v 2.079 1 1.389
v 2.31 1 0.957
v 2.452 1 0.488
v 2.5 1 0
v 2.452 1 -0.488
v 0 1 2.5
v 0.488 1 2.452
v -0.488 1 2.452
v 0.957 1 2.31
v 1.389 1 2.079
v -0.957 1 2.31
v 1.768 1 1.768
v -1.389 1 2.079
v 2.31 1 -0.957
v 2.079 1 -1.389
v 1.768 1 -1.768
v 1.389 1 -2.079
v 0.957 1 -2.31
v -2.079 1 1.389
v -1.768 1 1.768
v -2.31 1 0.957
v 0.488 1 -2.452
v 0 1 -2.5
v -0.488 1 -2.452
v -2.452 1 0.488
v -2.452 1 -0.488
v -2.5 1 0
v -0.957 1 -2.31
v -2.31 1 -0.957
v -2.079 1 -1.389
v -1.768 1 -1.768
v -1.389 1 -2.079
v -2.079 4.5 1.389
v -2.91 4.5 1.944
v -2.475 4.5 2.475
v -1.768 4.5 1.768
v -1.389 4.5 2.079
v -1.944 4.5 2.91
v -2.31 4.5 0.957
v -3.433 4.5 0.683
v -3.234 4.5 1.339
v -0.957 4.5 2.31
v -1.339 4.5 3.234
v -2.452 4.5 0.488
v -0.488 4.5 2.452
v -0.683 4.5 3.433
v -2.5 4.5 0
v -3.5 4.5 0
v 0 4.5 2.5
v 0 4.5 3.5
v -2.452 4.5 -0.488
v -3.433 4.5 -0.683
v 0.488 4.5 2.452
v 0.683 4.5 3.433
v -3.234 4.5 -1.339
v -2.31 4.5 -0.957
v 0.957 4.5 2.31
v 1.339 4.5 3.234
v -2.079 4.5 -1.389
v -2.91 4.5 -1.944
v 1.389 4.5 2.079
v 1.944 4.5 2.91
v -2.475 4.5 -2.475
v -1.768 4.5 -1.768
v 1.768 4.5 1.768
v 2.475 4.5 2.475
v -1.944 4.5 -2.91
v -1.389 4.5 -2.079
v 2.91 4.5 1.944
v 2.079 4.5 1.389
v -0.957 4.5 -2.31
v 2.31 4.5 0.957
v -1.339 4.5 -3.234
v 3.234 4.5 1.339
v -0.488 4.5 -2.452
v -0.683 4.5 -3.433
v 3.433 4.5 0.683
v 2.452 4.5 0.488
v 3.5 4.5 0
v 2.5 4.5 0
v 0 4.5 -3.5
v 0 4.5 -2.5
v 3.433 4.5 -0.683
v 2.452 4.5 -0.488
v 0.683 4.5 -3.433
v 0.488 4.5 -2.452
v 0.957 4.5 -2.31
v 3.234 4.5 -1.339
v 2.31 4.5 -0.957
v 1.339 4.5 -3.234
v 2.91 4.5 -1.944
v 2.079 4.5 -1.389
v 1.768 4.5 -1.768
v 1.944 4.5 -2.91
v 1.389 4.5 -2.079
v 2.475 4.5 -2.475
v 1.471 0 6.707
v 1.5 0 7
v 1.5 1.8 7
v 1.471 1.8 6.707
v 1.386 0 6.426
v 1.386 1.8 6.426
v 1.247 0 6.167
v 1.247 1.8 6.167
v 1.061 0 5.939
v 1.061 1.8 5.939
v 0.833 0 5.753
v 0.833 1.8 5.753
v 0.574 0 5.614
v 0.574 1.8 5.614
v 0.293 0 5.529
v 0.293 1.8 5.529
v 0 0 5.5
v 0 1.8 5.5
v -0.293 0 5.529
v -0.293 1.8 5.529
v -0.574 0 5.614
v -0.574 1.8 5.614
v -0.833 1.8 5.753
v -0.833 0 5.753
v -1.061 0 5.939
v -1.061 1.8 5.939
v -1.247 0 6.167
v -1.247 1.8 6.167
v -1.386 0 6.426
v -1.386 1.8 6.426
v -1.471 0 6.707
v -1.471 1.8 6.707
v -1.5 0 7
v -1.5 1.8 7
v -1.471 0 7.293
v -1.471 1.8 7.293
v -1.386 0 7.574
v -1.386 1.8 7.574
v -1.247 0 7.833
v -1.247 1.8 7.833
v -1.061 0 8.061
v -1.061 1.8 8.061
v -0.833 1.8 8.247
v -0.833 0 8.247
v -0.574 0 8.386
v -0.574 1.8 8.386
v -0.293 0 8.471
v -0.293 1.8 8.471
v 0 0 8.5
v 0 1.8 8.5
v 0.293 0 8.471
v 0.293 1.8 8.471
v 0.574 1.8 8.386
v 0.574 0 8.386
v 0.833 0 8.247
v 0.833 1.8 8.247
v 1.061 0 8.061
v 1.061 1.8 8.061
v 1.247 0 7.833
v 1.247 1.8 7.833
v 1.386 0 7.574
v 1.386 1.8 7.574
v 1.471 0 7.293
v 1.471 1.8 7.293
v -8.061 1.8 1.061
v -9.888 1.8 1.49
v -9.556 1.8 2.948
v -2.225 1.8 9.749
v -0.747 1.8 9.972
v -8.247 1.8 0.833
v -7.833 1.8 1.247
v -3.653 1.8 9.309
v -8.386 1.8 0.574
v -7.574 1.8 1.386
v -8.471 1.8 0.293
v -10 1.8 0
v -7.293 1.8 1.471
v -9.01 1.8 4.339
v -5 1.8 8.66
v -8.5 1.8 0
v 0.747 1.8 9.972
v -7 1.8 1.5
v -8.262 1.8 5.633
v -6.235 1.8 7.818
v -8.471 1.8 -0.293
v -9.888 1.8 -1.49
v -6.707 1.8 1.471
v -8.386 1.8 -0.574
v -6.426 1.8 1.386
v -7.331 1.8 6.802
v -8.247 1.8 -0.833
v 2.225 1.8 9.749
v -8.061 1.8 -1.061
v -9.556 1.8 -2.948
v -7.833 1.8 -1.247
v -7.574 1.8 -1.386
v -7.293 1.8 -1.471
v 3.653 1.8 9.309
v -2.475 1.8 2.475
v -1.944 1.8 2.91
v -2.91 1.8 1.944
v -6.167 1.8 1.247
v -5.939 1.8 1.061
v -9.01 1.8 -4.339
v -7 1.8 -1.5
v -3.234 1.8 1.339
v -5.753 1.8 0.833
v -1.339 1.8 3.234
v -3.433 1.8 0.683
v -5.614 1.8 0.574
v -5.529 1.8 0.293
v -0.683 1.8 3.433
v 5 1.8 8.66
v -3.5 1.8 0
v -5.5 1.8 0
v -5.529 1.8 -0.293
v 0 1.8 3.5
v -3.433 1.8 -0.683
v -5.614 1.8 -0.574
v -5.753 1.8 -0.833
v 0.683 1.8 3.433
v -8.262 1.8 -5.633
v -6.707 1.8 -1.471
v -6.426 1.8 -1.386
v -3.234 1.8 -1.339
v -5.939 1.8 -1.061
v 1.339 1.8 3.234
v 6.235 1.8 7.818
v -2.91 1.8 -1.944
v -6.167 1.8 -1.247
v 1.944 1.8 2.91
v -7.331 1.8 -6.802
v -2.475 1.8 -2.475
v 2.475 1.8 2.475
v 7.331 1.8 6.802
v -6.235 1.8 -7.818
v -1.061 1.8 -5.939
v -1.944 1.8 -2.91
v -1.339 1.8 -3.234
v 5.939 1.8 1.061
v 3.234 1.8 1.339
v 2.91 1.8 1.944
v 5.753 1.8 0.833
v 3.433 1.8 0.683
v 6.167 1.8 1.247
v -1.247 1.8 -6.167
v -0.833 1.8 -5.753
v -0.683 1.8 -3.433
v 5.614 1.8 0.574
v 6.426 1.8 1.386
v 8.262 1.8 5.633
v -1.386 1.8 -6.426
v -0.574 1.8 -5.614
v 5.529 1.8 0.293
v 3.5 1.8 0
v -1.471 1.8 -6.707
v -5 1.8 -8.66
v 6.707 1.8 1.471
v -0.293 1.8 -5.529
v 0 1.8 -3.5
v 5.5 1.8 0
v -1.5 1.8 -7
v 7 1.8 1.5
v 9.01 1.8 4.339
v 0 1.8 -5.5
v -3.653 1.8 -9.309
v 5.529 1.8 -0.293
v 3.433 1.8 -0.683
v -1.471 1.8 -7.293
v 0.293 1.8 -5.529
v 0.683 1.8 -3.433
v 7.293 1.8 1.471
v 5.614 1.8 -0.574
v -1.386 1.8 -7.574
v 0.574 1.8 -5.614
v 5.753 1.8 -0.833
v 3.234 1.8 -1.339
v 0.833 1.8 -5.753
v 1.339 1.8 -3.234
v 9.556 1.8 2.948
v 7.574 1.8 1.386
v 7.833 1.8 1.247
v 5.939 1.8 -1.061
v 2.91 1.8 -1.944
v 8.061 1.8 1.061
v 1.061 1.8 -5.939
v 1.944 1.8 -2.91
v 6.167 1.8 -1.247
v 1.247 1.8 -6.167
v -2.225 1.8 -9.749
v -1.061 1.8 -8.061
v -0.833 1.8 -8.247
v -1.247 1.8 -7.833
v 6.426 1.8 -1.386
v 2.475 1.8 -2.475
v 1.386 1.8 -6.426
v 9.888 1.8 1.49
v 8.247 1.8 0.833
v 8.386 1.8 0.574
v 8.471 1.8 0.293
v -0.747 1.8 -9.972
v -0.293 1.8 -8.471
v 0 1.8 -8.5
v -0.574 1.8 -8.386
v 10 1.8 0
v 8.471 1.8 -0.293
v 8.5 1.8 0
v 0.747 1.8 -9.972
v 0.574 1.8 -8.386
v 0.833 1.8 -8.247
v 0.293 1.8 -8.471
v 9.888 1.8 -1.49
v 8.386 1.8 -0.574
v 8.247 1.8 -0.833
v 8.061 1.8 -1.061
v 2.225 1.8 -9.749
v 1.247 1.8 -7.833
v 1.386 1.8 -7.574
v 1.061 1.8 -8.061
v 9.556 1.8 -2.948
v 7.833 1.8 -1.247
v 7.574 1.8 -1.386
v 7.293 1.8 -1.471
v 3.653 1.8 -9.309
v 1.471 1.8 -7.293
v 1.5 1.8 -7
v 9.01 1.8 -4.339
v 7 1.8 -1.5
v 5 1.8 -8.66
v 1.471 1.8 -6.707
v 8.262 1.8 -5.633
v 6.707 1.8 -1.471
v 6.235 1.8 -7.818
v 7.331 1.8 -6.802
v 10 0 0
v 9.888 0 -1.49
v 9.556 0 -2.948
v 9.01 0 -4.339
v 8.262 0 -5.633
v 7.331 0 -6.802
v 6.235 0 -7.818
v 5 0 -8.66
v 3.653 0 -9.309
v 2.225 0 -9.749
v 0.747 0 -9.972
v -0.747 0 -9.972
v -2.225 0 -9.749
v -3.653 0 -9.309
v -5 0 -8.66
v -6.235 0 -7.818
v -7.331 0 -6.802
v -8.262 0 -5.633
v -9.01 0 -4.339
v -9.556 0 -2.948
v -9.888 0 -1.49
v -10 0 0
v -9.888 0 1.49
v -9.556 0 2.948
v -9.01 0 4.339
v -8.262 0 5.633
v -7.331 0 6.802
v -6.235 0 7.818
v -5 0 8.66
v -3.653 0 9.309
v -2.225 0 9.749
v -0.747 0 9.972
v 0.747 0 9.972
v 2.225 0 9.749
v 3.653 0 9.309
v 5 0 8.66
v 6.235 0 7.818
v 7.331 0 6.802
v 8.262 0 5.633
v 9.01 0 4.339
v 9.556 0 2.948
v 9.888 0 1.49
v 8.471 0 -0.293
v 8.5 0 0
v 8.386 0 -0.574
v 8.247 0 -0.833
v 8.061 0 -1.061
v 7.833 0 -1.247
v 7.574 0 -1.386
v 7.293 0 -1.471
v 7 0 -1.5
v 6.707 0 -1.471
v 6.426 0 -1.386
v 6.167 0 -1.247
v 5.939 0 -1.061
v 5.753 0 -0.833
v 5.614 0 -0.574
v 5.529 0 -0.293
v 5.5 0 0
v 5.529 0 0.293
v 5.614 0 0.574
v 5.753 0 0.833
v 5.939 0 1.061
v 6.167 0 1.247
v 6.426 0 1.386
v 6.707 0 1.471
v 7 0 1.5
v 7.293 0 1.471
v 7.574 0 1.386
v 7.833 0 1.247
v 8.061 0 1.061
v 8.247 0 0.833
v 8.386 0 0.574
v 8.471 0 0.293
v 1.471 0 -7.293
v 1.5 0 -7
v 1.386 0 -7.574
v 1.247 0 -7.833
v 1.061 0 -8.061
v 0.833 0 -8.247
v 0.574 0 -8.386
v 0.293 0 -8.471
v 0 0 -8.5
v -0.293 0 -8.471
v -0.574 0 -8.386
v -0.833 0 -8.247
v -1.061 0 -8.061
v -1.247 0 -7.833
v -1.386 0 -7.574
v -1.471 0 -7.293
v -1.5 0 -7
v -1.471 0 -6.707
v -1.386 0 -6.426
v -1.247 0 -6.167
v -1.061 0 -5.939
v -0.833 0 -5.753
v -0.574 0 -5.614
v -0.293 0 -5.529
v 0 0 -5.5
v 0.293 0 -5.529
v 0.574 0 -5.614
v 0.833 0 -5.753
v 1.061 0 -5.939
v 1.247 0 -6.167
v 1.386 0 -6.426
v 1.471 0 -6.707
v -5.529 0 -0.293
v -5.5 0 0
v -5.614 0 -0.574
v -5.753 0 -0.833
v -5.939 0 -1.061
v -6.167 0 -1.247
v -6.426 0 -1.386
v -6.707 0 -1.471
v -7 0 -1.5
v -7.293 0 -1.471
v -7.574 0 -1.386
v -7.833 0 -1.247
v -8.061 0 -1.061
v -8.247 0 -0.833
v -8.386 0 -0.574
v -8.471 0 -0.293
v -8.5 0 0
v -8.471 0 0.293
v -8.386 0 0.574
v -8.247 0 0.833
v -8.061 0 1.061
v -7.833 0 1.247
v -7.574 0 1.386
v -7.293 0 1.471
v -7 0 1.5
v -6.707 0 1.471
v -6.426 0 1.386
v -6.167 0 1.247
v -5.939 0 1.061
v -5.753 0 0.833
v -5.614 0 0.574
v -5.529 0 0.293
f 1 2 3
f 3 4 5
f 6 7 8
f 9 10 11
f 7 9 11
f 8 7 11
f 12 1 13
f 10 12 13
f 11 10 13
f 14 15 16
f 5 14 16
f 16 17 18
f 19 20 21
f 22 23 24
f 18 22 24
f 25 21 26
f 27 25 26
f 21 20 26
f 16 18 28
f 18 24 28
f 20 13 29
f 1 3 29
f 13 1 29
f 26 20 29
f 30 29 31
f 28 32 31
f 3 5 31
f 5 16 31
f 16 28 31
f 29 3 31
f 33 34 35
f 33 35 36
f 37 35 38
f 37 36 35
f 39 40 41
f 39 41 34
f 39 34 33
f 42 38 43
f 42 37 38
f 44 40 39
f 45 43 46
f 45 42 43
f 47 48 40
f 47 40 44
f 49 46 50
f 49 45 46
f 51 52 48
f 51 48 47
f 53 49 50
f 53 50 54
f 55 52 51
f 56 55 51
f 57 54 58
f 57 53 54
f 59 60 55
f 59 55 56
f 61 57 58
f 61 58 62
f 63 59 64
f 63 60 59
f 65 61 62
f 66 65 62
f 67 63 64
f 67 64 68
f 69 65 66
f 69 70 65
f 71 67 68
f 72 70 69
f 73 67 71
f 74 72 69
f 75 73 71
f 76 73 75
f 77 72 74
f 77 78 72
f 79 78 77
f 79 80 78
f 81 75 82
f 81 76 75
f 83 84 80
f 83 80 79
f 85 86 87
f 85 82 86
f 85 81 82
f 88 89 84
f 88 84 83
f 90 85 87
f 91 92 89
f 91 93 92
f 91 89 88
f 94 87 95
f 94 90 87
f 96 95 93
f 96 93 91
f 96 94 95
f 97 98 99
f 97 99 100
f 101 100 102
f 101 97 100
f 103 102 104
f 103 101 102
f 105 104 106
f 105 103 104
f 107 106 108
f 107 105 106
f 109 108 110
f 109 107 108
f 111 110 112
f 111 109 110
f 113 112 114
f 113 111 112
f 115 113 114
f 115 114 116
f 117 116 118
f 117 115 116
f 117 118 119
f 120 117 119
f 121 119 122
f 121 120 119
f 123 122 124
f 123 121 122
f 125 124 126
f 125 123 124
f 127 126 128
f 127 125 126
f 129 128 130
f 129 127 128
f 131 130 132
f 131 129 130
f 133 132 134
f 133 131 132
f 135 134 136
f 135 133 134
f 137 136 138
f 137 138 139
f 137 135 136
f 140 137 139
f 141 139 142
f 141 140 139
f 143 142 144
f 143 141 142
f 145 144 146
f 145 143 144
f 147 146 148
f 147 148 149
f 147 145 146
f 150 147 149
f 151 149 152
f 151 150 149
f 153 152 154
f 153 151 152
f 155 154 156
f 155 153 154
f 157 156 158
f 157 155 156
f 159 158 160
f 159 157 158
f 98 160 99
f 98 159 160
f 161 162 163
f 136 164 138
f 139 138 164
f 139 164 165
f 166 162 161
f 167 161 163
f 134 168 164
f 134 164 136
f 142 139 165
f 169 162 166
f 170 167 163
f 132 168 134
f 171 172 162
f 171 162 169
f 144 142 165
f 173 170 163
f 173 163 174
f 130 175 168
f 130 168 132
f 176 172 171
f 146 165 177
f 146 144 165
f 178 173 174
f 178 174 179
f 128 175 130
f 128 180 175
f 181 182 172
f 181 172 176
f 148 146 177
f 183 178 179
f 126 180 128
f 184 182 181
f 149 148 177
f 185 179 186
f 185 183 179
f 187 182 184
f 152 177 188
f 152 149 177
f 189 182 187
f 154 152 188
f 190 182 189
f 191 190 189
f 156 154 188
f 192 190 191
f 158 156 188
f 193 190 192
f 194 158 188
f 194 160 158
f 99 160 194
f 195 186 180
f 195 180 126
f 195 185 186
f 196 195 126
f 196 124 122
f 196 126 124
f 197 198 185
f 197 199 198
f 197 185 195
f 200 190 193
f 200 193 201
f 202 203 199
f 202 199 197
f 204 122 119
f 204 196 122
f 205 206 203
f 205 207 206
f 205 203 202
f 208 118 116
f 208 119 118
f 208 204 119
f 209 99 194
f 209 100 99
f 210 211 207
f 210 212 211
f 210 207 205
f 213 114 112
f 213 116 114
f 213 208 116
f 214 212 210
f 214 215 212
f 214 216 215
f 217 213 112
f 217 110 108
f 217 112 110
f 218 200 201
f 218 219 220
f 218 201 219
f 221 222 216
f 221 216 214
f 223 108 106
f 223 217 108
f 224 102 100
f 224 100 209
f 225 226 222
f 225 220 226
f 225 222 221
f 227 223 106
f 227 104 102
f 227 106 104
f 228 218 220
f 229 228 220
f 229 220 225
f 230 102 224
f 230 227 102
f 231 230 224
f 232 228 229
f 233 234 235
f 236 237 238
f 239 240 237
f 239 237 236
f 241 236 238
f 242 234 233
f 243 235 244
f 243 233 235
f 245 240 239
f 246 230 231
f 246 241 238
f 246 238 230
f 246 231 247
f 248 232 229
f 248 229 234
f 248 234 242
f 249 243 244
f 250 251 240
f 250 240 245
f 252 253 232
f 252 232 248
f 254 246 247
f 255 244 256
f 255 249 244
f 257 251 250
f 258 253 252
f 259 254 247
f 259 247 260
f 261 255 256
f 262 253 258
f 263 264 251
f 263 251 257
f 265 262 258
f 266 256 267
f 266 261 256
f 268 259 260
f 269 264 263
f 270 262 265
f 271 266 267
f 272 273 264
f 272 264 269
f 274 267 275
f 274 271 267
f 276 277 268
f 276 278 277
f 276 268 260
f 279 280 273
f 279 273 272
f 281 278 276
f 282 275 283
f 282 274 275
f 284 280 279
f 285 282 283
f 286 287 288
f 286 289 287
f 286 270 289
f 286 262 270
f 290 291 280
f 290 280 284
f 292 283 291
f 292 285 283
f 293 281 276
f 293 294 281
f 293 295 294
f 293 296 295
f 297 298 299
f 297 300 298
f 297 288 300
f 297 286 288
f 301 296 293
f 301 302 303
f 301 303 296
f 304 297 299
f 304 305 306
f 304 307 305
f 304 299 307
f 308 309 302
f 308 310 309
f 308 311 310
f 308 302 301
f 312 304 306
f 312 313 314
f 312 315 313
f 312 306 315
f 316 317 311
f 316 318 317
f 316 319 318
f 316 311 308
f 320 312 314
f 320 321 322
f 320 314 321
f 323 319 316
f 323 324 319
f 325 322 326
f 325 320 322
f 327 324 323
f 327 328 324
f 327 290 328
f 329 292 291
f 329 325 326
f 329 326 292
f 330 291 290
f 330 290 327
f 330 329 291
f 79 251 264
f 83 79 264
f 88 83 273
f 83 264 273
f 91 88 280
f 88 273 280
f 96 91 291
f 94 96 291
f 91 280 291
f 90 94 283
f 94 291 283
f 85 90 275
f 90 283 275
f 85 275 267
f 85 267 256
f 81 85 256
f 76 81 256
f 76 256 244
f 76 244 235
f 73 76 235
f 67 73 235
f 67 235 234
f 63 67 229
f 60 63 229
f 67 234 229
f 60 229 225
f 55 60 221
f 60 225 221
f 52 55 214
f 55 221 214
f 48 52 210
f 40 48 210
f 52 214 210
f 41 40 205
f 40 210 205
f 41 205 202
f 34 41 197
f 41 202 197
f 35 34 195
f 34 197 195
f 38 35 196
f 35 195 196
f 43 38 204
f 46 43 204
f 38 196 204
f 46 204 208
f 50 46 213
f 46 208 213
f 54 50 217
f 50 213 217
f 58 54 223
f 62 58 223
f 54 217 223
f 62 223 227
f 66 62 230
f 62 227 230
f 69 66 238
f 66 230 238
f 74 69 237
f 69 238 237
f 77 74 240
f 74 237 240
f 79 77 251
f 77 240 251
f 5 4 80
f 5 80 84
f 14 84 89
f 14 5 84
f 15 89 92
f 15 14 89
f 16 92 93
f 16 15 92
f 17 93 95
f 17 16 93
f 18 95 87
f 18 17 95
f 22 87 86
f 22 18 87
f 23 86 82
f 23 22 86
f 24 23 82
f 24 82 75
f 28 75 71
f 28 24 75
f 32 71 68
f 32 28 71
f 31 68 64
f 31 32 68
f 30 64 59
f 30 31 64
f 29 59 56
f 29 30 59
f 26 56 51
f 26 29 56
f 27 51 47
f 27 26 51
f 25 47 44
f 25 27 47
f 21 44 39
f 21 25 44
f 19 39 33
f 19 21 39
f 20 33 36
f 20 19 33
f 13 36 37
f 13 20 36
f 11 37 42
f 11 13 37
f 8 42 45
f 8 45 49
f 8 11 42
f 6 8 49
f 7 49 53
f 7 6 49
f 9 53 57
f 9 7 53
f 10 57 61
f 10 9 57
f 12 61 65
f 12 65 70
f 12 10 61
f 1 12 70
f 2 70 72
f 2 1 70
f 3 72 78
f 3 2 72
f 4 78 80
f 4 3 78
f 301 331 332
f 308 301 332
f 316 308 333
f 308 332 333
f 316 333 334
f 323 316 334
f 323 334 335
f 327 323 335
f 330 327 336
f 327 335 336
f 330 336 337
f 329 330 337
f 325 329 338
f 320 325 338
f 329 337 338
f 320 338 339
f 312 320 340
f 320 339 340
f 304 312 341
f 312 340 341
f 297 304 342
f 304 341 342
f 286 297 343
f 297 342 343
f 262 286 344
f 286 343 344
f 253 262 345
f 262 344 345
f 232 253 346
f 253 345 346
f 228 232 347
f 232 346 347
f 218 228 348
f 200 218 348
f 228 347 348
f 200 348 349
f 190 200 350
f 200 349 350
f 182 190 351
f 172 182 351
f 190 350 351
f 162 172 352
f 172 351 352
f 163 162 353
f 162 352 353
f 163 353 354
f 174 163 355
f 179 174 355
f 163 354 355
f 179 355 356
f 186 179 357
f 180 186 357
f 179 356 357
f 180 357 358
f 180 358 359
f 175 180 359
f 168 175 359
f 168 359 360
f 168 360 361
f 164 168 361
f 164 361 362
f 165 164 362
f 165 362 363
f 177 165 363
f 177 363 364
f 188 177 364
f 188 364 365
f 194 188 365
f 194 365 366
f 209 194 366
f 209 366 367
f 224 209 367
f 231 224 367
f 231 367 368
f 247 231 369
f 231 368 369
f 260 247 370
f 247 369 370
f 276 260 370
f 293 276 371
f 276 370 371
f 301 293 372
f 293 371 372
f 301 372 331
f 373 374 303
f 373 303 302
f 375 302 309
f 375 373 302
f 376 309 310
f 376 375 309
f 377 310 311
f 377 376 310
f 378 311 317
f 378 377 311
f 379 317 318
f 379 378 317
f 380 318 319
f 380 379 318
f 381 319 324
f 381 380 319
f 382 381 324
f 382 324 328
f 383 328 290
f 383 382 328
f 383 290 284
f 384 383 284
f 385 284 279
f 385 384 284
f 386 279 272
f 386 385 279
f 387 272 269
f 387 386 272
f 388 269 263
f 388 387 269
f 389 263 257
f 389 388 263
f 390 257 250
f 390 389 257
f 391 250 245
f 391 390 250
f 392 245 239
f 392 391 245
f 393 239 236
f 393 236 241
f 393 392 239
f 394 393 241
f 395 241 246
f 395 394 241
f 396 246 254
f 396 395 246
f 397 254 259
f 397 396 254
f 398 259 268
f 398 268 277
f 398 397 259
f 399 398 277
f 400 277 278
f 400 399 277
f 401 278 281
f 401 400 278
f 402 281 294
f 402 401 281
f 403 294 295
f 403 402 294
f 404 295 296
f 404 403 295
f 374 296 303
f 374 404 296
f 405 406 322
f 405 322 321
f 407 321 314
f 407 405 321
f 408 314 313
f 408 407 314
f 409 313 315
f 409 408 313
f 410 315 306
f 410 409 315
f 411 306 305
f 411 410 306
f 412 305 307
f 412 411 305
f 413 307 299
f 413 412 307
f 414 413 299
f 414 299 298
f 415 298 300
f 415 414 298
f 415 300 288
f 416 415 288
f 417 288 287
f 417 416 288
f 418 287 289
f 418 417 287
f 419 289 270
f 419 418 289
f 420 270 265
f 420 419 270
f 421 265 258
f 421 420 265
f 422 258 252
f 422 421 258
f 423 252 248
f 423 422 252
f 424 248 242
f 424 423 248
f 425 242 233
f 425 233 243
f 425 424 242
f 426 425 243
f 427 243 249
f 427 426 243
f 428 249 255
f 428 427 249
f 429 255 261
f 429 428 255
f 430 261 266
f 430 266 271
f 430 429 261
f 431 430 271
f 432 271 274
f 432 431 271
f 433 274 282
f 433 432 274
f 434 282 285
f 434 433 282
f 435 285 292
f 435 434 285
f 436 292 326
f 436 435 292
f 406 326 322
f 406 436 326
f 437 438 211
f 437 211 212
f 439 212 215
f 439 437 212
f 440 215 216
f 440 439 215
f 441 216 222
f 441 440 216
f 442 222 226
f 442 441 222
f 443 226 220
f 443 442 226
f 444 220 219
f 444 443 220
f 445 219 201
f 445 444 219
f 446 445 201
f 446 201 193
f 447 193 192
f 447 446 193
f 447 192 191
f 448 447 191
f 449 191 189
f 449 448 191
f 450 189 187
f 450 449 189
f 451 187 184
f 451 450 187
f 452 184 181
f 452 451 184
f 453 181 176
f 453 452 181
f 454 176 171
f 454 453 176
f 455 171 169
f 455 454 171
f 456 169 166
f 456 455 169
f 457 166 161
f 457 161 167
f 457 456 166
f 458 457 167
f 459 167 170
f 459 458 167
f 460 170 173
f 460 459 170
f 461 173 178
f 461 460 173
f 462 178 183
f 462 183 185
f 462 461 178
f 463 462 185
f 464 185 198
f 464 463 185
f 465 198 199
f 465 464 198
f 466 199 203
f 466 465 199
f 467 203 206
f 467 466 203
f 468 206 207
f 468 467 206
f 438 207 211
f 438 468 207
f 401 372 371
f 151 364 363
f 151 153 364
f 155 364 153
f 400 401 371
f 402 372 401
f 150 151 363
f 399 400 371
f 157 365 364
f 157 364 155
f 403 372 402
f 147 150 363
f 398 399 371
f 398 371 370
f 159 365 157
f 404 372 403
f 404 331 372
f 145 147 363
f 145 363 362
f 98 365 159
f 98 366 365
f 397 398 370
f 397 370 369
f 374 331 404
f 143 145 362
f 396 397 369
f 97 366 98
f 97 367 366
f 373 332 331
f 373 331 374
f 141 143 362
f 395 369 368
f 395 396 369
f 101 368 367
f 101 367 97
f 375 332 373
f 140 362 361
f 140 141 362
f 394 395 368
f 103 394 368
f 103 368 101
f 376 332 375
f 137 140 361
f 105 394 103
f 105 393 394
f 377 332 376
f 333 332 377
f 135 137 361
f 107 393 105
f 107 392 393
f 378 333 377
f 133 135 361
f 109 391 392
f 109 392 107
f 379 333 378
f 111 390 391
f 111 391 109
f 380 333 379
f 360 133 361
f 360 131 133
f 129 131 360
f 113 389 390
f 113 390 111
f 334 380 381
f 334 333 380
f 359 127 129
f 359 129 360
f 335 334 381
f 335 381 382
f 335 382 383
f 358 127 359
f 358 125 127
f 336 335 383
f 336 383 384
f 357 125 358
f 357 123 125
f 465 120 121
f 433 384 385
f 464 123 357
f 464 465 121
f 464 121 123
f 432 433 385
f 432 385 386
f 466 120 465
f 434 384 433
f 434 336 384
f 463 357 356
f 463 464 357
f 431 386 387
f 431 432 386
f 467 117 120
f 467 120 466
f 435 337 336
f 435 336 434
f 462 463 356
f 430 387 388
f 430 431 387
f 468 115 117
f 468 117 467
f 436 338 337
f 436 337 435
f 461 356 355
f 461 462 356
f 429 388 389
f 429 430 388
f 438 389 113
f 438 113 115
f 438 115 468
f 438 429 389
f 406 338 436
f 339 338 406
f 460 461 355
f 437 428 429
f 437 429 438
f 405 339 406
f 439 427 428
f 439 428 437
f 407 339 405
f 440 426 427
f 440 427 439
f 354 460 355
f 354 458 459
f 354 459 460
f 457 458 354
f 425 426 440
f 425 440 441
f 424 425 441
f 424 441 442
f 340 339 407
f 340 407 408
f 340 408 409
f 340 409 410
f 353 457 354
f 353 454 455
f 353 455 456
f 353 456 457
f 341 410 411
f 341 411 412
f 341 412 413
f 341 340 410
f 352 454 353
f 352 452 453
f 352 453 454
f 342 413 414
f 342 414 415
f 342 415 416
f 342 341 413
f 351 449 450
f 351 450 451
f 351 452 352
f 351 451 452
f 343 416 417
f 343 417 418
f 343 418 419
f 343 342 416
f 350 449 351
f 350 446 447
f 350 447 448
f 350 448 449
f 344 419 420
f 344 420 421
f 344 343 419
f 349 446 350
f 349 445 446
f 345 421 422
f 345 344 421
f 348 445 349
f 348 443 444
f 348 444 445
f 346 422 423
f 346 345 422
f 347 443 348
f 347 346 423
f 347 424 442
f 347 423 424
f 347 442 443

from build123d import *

# Parameters (mm, degrees)
SKETCH1_R           = 10
SKETCH1_R_2         = 2.5
SKETCH1_R_3         = 1.5
BOSS_EXTRUDE1_DEPTH = 1.8
SKETCH2_R           = 3.5
SKETCH2_R_2         = 2.5
BOSS_EXTRUDE2_DEPTH = 2.7
SKETCH3_R           = 2.5
BOSS_EXTRUDE3_DEPTH = 1


with BuildPart() as part:
    # Sketch1 → Boss-Extrude1 (new body)
    with BuildSketch(Plane(origin=(0, 0, 0), x_dir=(1, 0, 0), z_dir=(0, 1, 0))):
        Circle(SKETCH1_R)
        Circle(SKETCH1_R_2, mode=Mode.SUBTRACT)
        with Locations((0, 7)):
            Circle(SKETCH1_R_3, mode=Mode.SUBTRACT)
        with Locations((7, 0)):
            Circle(SKETCH1_R_3, mode=Mode.SUBTRACT)
        with Locations((0, -7)):
            Circle(SKETCH1_R_3, mode=Mode.SUBTRACT)
        with Locations((-7, 0)):
            Circle(SKETCH1_R_3, mode=Mode.SUBTRACT)
    extrude(amount=BOSS_EXTRUDE1_DEPTH)

    # Sketch2 → Boss-Extrude2 (add)
    with BuildSketch(Plane(origin=(0, 1.8, 0), x_dir=(1, 0, 0), z_dir=(0, 1, 0))):
        Circle(SKETCH2_R)
        Circle(SKETCH2_R_2, mode=Mode.SUBTRACT)
    extrude(amount=BOSS_EXTRUDE2_DEPTH)

    # Sketch3 → Boss-Extrude3 (add)
    with BuildSketch(Plane(origin=(0, 0, 0), x_dir=(-1, 0, 0), z_dir=(0, -1, 0))):
        Circle(SKETCH3_R)
    extrude(amount=-BOSS_EXTRUDE3_DEPTH)


solid = part.part
